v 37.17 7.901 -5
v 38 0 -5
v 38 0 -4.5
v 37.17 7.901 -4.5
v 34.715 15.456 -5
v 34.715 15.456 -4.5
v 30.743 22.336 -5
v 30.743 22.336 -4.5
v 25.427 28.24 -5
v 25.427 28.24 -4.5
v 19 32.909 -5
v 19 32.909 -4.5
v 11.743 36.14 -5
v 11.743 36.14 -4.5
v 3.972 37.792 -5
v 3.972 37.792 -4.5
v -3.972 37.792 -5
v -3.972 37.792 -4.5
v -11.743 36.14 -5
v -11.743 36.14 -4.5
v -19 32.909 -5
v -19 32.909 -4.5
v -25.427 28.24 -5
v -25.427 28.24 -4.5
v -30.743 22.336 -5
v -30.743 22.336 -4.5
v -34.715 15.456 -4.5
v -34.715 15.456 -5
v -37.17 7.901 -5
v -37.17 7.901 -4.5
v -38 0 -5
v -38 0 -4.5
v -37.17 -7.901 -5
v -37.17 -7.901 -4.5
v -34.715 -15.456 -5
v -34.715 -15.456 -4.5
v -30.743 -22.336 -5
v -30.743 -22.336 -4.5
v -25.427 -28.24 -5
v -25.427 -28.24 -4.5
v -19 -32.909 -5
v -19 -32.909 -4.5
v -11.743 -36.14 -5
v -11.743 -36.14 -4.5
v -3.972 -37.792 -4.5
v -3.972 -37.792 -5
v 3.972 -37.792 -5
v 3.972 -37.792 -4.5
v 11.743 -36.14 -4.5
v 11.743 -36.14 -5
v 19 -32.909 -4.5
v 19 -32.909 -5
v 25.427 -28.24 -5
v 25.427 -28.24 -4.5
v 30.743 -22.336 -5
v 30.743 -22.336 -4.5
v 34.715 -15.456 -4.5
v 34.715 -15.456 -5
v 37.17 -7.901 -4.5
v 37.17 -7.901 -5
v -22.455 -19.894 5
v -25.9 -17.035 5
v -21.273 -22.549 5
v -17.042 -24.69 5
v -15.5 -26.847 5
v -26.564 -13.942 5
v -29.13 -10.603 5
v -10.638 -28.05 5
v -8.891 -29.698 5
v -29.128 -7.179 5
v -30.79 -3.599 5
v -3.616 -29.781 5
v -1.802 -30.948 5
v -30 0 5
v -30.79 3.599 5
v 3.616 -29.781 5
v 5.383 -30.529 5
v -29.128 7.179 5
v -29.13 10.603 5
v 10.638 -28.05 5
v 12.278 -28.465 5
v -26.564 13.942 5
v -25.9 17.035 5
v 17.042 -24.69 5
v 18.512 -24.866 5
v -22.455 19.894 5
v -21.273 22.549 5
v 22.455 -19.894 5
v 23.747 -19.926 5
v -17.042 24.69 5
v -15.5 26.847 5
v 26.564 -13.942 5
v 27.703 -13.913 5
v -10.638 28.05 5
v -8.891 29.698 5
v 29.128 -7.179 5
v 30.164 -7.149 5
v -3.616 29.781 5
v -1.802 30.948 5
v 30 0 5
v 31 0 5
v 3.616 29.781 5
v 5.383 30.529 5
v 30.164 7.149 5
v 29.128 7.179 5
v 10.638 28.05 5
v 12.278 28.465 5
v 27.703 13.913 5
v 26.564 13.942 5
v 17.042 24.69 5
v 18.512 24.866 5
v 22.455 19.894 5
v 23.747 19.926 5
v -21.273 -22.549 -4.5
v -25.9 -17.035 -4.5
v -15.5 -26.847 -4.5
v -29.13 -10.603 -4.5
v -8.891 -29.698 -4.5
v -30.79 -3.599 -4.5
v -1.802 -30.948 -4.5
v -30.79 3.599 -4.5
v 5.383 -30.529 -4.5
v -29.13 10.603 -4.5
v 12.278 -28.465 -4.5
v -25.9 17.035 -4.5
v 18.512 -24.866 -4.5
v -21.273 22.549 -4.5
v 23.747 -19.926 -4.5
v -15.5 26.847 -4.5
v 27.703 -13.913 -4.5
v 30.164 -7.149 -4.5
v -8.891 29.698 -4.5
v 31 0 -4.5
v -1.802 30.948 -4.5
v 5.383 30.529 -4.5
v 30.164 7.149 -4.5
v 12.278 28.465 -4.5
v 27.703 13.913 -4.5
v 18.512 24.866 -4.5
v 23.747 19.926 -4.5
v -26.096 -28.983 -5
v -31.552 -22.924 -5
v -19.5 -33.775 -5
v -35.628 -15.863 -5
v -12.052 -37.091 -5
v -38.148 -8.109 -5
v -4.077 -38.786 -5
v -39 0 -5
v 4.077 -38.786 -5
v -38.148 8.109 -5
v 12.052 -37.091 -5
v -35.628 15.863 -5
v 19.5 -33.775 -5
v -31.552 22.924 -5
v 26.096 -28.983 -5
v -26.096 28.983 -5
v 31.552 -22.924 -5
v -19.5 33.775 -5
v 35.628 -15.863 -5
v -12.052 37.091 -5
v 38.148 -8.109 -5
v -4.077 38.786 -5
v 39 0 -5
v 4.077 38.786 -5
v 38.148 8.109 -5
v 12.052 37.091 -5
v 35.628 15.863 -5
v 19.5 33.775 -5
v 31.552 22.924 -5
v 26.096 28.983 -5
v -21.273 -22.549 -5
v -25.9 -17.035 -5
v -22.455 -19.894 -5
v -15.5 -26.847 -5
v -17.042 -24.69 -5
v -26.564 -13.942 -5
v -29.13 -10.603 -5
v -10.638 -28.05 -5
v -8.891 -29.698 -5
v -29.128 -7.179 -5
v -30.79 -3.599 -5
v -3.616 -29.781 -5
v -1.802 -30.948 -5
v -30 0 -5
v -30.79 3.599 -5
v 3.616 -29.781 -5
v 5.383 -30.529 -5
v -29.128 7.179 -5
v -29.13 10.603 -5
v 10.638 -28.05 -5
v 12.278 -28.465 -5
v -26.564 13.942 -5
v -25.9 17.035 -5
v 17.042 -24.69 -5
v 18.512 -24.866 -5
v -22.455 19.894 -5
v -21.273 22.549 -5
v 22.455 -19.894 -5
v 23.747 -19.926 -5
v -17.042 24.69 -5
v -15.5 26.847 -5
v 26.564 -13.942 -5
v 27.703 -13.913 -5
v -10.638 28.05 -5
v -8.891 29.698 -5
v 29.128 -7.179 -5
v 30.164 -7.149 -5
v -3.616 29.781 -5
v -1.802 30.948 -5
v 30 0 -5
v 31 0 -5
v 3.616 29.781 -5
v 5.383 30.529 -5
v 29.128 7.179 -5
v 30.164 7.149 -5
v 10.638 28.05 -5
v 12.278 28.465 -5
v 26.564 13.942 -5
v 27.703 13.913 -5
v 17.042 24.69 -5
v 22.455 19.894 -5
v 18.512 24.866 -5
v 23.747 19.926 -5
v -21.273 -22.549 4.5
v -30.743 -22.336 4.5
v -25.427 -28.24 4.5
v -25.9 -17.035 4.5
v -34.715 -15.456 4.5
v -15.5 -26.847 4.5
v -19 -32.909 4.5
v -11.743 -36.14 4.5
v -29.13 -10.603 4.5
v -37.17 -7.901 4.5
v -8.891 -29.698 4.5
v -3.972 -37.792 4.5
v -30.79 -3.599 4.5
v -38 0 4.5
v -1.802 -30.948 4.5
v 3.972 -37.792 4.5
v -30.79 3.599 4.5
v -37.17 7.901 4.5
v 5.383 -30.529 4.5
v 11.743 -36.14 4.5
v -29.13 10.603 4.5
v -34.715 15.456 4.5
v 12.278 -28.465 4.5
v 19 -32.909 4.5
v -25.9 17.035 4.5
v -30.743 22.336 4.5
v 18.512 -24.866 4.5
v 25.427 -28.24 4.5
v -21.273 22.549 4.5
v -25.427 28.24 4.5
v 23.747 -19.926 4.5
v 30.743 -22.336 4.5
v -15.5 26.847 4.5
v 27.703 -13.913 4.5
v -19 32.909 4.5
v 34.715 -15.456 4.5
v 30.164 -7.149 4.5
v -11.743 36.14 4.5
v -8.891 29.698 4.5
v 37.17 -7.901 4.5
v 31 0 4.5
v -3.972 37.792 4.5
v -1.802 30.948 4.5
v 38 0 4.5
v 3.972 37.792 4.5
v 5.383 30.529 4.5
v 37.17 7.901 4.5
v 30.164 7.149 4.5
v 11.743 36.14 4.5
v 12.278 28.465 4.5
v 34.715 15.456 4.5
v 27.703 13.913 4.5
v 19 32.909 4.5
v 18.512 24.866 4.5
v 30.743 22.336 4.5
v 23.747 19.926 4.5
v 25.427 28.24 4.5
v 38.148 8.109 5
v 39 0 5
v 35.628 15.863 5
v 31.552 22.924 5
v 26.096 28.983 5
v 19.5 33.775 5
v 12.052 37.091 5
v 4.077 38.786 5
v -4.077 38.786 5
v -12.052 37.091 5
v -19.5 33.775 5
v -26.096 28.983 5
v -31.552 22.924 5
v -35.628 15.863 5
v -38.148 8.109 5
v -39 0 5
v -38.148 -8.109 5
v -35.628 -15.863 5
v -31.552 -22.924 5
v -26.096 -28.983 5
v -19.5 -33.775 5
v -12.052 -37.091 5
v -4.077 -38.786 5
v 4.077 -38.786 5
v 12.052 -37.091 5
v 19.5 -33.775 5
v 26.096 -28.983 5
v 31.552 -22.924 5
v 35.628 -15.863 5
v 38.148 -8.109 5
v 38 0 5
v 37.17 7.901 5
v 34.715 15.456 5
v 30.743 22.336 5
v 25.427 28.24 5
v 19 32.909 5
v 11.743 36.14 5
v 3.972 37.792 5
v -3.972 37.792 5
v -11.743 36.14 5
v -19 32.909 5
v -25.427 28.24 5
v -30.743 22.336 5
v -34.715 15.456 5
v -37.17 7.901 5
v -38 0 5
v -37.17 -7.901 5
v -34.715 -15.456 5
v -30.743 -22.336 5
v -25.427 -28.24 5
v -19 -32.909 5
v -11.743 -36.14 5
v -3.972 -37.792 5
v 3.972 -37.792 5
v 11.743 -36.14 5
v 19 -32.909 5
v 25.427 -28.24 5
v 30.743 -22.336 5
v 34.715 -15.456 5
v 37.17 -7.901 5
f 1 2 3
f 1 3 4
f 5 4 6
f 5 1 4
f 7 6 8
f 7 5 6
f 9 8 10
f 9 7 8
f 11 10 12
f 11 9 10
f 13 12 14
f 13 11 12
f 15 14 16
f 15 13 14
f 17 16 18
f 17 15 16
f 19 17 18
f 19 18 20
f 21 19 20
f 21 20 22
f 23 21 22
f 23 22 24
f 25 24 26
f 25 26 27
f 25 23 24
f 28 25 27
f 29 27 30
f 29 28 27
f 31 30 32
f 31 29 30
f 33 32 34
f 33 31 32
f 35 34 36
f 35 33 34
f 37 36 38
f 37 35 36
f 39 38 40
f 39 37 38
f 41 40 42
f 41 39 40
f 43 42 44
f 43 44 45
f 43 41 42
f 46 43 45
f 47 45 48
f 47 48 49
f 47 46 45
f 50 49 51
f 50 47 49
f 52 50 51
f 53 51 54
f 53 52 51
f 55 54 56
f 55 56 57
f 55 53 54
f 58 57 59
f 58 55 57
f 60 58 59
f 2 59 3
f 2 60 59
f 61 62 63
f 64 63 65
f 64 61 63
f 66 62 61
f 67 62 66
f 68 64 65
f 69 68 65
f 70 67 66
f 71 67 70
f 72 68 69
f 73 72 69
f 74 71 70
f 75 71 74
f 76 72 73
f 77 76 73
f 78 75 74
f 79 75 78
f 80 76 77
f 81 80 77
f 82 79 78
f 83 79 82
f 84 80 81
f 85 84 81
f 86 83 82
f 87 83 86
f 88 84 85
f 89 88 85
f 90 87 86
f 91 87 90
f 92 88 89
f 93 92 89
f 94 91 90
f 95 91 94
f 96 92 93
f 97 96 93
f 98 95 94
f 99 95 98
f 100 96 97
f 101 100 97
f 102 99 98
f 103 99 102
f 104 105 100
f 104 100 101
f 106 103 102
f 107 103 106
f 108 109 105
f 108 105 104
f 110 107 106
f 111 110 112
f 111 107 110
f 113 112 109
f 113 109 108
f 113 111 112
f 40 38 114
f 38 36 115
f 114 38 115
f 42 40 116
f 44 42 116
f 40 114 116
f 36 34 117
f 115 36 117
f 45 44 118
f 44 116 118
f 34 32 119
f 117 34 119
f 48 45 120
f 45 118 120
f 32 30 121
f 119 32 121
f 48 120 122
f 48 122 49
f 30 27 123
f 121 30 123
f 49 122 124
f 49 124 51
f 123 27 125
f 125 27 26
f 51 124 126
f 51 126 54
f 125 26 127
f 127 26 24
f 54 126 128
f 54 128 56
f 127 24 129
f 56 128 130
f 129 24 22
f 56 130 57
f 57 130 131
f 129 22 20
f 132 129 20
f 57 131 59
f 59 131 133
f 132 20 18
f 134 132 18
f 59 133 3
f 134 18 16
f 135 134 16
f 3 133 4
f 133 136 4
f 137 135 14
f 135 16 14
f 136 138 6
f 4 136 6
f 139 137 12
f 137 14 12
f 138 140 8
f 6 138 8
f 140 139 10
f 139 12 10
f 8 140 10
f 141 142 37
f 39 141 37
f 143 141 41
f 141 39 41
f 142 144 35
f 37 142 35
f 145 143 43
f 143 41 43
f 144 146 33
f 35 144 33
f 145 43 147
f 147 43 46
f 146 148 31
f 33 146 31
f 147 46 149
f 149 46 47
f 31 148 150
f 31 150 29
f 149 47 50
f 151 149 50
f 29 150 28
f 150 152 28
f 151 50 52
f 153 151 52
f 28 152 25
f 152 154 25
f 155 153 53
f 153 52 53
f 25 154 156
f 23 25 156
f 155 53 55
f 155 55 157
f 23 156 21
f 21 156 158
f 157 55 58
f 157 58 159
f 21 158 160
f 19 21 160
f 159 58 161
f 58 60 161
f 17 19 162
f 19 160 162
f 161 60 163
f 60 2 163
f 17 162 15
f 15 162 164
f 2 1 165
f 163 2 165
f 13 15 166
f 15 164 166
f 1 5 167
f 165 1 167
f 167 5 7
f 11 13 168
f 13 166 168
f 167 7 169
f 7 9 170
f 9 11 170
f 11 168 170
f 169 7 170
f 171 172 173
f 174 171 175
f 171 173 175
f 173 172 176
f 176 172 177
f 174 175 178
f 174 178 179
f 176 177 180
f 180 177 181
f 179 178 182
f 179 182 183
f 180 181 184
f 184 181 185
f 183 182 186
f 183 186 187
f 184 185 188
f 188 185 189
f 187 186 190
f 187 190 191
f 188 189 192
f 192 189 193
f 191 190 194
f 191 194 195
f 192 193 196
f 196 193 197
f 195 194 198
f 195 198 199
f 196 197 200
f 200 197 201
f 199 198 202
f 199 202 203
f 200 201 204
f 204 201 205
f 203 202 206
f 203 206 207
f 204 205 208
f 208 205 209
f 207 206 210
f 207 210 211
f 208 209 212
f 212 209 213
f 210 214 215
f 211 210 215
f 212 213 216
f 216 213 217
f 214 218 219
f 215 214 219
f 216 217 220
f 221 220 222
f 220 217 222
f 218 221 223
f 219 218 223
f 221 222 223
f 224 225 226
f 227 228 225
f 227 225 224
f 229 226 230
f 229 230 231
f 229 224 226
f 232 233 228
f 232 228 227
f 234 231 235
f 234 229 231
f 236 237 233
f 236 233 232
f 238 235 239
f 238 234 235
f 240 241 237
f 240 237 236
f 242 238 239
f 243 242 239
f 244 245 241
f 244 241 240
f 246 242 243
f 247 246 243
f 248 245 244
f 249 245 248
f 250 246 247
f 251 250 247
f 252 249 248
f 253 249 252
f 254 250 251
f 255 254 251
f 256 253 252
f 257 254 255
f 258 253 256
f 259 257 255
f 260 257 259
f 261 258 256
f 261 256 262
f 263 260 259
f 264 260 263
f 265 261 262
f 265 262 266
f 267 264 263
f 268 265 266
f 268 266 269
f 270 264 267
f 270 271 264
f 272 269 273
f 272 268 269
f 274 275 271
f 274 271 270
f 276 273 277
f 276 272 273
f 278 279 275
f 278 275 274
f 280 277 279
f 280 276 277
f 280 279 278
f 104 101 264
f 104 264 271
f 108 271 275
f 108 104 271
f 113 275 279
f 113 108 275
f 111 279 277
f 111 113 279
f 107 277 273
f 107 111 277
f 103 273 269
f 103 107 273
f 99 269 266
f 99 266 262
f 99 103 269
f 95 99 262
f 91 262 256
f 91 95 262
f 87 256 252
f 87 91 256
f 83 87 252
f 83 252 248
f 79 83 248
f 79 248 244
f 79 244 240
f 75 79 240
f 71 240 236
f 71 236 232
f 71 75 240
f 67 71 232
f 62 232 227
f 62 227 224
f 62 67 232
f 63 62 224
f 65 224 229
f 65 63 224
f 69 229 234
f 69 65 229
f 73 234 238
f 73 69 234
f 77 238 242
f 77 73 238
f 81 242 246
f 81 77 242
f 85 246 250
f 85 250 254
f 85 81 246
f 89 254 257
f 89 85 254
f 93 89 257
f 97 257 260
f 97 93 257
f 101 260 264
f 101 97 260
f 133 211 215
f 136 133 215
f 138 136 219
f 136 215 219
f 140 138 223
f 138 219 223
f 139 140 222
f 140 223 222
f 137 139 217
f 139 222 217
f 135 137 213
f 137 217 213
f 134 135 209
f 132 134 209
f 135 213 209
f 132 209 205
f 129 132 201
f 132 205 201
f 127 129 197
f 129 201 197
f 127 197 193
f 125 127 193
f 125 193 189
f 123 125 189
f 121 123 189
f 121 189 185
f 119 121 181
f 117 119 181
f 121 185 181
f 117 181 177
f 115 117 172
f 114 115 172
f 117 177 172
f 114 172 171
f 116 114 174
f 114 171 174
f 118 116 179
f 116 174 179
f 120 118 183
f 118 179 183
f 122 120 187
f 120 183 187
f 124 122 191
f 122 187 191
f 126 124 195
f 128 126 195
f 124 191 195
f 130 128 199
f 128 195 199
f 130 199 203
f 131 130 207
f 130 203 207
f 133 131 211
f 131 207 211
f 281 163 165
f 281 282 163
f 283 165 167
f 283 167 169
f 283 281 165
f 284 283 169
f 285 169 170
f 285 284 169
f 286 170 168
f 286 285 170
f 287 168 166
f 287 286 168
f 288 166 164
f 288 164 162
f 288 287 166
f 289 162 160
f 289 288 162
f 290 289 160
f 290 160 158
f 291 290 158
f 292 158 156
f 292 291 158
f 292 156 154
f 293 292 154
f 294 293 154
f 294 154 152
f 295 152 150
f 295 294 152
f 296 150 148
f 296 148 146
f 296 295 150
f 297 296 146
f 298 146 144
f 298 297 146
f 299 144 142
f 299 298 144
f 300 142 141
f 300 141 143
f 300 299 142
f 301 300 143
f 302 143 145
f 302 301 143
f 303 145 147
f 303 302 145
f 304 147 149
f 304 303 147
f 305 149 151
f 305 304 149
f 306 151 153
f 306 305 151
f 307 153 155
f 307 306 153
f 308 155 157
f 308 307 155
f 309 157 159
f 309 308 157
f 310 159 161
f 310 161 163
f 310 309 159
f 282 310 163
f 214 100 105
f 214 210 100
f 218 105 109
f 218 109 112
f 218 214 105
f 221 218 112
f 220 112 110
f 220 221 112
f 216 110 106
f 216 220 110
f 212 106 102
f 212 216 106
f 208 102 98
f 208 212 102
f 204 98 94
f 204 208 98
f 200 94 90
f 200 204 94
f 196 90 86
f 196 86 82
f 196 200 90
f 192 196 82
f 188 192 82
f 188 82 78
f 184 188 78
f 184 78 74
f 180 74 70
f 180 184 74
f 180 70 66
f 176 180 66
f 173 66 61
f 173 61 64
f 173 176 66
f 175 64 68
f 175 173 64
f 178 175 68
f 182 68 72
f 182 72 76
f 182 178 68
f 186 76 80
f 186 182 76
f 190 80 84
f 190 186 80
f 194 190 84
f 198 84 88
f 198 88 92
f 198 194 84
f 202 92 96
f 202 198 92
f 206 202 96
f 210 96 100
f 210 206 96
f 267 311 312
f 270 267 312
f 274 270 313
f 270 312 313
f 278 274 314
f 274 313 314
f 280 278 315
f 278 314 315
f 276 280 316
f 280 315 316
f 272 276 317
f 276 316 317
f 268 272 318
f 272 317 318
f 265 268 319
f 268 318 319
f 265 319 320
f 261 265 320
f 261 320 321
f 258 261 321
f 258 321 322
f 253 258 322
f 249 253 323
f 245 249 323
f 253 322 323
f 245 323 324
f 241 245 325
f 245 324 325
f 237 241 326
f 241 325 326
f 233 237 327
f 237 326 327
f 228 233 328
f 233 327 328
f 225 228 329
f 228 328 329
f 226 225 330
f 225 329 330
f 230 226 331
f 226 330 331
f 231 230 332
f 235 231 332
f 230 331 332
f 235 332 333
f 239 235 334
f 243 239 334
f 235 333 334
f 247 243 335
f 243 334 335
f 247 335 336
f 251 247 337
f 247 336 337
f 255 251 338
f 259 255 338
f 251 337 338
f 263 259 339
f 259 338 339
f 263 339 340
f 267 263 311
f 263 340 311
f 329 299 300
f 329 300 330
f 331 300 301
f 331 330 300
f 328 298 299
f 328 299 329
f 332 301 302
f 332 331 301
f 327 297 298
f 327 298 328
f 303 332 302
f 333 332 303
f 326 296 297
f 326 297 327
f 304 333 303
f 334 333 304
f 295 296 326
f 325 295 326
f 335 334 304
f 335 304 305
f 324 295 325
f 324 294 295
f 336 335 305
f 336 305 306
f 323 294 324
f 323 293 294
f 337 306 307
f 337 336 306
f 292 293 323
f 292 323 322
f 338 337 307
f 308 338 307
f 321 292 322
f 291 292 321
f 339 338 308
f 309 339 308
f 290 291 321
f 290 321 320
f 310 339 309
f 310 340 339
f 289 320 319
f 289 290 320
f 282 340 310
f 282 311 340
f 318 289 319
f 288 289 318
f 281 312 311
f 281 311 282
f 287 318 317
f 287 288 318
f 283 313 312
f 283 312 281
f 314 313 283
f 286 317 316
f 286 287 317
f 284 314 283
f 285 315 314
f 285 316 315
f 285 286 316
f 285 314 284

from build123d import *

# Parameters (mm, degrees)
F0_R     = 39
F0_R_2   = 30
F1_DEPTH = 5
F2_R     = 38
F2_R_2   = 31
F3_DEPTH = 0.5


# Not quite as in the source:
# - a pattern or mirror of a feature is missing from the dataset's text; its kind, count and spacing are read off the source's solid


with BuildPart() as f1:
    # F0 (on Top) → F1 (new body, symmetric)
    with BuildSketch(Plane.XY):
        Circle(F0_R)
        Circle(F0_R_2, mode=Mode.SUBTRACT)
    extrude(amount=F1_DEPTH, both=True)

    # F2 (on face) → F3 (cut)
    with BuildSketch(Plane.XY.offset(5)):
        Circle(F2_R)
        Circle(F2_R_2, mode=Mode.SUBTRACT)
    f3 = extrude(amount=-F3_DEPTH, mode=Mode.SUBTRACT)

    # F3_copies: F3 across plane
    add(f3.mirror(Plane(origin=(0, 0, 0), x_dir=(-1, 0, 0), z_dir=(0, 0, -1))), mode=Mode.SUBTRACT)


solid = f1.part
